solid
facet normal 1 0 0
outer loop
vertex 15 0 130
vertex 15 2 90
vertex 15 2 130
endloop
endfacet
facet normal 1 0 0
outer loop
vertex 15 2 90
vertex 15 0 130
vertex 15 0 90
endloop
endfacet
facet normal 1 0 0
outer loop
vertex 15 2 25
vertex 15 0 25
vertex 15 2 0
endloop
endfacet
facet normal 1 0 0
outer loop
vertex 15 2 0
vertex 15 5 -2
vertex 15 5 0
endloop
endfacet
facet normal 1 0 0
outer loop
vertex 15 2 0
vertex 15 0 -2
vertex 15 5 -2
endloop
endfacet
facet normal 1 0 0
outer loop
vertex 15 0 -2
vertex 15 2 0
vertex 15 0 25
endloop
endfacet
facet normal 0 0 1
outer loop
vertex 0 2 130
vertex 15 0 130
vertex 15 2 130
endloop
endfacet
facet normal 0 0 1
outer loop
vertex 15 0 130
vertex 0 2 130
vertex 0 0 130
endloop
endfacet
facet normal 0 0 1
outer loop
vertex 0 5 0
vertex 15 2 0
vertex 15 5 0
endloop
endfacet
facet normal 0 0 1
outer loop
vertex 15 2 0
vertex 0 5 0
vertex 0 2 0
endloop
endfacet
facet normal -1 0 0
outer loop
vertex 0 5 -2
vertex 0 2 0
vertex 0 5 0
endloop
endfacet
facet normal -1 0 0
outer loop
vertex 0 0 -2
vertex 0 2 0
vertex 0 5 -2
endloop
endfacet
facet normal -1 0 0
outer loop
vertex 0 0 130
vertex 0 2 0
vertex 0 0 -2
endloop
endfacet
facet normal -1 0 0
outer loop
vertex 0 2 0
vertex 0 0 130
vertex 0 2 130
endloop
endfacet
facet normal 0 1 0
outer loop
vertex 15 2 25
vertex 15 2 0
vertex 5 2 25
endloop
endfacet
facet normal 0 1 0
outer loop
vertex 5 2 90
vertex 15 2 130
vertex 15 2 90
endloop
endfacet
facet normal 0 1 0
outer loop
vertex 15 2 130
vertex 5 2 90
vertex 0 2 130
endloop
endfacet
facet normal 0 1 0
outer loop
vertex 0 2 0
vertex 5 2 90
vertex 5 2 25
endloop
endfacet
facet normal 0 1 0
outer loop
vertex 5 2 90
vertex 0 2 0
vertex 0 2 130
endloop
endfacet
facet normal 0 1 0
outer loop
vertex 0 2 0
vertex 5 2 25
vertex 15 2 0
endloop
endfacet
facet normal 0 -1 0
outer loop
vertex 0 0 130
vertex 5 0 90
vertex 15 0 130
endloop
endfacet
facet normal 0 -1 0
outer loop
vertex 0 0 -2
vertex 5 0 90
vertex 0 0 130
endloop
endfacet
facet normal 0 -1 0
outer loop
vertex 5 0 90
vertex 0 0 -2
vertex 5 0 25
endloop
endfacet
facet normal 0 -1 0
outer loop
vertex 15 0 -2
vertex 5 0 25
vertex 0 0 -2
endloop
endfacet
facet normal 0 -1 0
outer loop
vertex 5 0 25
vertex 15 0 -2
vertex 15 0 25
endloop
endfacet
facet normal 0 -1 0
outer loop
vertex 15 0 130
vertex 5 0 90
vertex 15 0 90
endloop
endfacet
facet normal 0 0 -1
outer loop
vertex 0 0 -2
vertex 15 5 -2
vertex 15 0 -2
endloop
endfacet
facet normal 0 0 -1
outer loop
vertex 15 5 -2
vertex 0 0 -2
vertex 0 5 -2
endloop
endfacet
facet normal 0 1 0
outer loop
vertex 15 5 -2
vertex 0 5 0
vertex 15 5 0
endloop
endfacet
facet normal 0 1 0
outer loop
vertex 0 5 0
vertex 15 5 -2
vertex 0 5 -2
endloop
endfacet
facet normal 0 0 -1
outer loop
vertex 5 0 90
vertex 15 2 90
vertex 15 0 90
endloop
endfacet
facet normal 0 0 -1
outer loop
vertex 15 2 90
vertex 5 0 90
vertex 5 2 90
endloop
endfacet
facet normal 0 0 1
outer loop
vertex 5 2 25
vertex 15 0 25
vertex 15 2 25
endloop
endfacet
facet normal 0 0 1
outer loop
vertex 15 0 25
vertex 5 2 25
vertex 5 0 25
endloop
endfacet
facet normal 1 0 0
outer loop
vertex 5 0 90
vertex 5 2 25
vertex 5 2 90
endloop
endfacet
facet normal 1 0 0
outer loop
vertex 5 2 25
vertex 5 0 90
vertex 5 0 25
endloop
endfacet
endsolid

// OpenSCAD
$fn=100;


difference() {
    union(){
    cube([15,2,130]);
    translate([0,0,-2]) cube([15,5,2]);
    }
    
    translate([5,0,25]) cube([10,2,65]);
}
